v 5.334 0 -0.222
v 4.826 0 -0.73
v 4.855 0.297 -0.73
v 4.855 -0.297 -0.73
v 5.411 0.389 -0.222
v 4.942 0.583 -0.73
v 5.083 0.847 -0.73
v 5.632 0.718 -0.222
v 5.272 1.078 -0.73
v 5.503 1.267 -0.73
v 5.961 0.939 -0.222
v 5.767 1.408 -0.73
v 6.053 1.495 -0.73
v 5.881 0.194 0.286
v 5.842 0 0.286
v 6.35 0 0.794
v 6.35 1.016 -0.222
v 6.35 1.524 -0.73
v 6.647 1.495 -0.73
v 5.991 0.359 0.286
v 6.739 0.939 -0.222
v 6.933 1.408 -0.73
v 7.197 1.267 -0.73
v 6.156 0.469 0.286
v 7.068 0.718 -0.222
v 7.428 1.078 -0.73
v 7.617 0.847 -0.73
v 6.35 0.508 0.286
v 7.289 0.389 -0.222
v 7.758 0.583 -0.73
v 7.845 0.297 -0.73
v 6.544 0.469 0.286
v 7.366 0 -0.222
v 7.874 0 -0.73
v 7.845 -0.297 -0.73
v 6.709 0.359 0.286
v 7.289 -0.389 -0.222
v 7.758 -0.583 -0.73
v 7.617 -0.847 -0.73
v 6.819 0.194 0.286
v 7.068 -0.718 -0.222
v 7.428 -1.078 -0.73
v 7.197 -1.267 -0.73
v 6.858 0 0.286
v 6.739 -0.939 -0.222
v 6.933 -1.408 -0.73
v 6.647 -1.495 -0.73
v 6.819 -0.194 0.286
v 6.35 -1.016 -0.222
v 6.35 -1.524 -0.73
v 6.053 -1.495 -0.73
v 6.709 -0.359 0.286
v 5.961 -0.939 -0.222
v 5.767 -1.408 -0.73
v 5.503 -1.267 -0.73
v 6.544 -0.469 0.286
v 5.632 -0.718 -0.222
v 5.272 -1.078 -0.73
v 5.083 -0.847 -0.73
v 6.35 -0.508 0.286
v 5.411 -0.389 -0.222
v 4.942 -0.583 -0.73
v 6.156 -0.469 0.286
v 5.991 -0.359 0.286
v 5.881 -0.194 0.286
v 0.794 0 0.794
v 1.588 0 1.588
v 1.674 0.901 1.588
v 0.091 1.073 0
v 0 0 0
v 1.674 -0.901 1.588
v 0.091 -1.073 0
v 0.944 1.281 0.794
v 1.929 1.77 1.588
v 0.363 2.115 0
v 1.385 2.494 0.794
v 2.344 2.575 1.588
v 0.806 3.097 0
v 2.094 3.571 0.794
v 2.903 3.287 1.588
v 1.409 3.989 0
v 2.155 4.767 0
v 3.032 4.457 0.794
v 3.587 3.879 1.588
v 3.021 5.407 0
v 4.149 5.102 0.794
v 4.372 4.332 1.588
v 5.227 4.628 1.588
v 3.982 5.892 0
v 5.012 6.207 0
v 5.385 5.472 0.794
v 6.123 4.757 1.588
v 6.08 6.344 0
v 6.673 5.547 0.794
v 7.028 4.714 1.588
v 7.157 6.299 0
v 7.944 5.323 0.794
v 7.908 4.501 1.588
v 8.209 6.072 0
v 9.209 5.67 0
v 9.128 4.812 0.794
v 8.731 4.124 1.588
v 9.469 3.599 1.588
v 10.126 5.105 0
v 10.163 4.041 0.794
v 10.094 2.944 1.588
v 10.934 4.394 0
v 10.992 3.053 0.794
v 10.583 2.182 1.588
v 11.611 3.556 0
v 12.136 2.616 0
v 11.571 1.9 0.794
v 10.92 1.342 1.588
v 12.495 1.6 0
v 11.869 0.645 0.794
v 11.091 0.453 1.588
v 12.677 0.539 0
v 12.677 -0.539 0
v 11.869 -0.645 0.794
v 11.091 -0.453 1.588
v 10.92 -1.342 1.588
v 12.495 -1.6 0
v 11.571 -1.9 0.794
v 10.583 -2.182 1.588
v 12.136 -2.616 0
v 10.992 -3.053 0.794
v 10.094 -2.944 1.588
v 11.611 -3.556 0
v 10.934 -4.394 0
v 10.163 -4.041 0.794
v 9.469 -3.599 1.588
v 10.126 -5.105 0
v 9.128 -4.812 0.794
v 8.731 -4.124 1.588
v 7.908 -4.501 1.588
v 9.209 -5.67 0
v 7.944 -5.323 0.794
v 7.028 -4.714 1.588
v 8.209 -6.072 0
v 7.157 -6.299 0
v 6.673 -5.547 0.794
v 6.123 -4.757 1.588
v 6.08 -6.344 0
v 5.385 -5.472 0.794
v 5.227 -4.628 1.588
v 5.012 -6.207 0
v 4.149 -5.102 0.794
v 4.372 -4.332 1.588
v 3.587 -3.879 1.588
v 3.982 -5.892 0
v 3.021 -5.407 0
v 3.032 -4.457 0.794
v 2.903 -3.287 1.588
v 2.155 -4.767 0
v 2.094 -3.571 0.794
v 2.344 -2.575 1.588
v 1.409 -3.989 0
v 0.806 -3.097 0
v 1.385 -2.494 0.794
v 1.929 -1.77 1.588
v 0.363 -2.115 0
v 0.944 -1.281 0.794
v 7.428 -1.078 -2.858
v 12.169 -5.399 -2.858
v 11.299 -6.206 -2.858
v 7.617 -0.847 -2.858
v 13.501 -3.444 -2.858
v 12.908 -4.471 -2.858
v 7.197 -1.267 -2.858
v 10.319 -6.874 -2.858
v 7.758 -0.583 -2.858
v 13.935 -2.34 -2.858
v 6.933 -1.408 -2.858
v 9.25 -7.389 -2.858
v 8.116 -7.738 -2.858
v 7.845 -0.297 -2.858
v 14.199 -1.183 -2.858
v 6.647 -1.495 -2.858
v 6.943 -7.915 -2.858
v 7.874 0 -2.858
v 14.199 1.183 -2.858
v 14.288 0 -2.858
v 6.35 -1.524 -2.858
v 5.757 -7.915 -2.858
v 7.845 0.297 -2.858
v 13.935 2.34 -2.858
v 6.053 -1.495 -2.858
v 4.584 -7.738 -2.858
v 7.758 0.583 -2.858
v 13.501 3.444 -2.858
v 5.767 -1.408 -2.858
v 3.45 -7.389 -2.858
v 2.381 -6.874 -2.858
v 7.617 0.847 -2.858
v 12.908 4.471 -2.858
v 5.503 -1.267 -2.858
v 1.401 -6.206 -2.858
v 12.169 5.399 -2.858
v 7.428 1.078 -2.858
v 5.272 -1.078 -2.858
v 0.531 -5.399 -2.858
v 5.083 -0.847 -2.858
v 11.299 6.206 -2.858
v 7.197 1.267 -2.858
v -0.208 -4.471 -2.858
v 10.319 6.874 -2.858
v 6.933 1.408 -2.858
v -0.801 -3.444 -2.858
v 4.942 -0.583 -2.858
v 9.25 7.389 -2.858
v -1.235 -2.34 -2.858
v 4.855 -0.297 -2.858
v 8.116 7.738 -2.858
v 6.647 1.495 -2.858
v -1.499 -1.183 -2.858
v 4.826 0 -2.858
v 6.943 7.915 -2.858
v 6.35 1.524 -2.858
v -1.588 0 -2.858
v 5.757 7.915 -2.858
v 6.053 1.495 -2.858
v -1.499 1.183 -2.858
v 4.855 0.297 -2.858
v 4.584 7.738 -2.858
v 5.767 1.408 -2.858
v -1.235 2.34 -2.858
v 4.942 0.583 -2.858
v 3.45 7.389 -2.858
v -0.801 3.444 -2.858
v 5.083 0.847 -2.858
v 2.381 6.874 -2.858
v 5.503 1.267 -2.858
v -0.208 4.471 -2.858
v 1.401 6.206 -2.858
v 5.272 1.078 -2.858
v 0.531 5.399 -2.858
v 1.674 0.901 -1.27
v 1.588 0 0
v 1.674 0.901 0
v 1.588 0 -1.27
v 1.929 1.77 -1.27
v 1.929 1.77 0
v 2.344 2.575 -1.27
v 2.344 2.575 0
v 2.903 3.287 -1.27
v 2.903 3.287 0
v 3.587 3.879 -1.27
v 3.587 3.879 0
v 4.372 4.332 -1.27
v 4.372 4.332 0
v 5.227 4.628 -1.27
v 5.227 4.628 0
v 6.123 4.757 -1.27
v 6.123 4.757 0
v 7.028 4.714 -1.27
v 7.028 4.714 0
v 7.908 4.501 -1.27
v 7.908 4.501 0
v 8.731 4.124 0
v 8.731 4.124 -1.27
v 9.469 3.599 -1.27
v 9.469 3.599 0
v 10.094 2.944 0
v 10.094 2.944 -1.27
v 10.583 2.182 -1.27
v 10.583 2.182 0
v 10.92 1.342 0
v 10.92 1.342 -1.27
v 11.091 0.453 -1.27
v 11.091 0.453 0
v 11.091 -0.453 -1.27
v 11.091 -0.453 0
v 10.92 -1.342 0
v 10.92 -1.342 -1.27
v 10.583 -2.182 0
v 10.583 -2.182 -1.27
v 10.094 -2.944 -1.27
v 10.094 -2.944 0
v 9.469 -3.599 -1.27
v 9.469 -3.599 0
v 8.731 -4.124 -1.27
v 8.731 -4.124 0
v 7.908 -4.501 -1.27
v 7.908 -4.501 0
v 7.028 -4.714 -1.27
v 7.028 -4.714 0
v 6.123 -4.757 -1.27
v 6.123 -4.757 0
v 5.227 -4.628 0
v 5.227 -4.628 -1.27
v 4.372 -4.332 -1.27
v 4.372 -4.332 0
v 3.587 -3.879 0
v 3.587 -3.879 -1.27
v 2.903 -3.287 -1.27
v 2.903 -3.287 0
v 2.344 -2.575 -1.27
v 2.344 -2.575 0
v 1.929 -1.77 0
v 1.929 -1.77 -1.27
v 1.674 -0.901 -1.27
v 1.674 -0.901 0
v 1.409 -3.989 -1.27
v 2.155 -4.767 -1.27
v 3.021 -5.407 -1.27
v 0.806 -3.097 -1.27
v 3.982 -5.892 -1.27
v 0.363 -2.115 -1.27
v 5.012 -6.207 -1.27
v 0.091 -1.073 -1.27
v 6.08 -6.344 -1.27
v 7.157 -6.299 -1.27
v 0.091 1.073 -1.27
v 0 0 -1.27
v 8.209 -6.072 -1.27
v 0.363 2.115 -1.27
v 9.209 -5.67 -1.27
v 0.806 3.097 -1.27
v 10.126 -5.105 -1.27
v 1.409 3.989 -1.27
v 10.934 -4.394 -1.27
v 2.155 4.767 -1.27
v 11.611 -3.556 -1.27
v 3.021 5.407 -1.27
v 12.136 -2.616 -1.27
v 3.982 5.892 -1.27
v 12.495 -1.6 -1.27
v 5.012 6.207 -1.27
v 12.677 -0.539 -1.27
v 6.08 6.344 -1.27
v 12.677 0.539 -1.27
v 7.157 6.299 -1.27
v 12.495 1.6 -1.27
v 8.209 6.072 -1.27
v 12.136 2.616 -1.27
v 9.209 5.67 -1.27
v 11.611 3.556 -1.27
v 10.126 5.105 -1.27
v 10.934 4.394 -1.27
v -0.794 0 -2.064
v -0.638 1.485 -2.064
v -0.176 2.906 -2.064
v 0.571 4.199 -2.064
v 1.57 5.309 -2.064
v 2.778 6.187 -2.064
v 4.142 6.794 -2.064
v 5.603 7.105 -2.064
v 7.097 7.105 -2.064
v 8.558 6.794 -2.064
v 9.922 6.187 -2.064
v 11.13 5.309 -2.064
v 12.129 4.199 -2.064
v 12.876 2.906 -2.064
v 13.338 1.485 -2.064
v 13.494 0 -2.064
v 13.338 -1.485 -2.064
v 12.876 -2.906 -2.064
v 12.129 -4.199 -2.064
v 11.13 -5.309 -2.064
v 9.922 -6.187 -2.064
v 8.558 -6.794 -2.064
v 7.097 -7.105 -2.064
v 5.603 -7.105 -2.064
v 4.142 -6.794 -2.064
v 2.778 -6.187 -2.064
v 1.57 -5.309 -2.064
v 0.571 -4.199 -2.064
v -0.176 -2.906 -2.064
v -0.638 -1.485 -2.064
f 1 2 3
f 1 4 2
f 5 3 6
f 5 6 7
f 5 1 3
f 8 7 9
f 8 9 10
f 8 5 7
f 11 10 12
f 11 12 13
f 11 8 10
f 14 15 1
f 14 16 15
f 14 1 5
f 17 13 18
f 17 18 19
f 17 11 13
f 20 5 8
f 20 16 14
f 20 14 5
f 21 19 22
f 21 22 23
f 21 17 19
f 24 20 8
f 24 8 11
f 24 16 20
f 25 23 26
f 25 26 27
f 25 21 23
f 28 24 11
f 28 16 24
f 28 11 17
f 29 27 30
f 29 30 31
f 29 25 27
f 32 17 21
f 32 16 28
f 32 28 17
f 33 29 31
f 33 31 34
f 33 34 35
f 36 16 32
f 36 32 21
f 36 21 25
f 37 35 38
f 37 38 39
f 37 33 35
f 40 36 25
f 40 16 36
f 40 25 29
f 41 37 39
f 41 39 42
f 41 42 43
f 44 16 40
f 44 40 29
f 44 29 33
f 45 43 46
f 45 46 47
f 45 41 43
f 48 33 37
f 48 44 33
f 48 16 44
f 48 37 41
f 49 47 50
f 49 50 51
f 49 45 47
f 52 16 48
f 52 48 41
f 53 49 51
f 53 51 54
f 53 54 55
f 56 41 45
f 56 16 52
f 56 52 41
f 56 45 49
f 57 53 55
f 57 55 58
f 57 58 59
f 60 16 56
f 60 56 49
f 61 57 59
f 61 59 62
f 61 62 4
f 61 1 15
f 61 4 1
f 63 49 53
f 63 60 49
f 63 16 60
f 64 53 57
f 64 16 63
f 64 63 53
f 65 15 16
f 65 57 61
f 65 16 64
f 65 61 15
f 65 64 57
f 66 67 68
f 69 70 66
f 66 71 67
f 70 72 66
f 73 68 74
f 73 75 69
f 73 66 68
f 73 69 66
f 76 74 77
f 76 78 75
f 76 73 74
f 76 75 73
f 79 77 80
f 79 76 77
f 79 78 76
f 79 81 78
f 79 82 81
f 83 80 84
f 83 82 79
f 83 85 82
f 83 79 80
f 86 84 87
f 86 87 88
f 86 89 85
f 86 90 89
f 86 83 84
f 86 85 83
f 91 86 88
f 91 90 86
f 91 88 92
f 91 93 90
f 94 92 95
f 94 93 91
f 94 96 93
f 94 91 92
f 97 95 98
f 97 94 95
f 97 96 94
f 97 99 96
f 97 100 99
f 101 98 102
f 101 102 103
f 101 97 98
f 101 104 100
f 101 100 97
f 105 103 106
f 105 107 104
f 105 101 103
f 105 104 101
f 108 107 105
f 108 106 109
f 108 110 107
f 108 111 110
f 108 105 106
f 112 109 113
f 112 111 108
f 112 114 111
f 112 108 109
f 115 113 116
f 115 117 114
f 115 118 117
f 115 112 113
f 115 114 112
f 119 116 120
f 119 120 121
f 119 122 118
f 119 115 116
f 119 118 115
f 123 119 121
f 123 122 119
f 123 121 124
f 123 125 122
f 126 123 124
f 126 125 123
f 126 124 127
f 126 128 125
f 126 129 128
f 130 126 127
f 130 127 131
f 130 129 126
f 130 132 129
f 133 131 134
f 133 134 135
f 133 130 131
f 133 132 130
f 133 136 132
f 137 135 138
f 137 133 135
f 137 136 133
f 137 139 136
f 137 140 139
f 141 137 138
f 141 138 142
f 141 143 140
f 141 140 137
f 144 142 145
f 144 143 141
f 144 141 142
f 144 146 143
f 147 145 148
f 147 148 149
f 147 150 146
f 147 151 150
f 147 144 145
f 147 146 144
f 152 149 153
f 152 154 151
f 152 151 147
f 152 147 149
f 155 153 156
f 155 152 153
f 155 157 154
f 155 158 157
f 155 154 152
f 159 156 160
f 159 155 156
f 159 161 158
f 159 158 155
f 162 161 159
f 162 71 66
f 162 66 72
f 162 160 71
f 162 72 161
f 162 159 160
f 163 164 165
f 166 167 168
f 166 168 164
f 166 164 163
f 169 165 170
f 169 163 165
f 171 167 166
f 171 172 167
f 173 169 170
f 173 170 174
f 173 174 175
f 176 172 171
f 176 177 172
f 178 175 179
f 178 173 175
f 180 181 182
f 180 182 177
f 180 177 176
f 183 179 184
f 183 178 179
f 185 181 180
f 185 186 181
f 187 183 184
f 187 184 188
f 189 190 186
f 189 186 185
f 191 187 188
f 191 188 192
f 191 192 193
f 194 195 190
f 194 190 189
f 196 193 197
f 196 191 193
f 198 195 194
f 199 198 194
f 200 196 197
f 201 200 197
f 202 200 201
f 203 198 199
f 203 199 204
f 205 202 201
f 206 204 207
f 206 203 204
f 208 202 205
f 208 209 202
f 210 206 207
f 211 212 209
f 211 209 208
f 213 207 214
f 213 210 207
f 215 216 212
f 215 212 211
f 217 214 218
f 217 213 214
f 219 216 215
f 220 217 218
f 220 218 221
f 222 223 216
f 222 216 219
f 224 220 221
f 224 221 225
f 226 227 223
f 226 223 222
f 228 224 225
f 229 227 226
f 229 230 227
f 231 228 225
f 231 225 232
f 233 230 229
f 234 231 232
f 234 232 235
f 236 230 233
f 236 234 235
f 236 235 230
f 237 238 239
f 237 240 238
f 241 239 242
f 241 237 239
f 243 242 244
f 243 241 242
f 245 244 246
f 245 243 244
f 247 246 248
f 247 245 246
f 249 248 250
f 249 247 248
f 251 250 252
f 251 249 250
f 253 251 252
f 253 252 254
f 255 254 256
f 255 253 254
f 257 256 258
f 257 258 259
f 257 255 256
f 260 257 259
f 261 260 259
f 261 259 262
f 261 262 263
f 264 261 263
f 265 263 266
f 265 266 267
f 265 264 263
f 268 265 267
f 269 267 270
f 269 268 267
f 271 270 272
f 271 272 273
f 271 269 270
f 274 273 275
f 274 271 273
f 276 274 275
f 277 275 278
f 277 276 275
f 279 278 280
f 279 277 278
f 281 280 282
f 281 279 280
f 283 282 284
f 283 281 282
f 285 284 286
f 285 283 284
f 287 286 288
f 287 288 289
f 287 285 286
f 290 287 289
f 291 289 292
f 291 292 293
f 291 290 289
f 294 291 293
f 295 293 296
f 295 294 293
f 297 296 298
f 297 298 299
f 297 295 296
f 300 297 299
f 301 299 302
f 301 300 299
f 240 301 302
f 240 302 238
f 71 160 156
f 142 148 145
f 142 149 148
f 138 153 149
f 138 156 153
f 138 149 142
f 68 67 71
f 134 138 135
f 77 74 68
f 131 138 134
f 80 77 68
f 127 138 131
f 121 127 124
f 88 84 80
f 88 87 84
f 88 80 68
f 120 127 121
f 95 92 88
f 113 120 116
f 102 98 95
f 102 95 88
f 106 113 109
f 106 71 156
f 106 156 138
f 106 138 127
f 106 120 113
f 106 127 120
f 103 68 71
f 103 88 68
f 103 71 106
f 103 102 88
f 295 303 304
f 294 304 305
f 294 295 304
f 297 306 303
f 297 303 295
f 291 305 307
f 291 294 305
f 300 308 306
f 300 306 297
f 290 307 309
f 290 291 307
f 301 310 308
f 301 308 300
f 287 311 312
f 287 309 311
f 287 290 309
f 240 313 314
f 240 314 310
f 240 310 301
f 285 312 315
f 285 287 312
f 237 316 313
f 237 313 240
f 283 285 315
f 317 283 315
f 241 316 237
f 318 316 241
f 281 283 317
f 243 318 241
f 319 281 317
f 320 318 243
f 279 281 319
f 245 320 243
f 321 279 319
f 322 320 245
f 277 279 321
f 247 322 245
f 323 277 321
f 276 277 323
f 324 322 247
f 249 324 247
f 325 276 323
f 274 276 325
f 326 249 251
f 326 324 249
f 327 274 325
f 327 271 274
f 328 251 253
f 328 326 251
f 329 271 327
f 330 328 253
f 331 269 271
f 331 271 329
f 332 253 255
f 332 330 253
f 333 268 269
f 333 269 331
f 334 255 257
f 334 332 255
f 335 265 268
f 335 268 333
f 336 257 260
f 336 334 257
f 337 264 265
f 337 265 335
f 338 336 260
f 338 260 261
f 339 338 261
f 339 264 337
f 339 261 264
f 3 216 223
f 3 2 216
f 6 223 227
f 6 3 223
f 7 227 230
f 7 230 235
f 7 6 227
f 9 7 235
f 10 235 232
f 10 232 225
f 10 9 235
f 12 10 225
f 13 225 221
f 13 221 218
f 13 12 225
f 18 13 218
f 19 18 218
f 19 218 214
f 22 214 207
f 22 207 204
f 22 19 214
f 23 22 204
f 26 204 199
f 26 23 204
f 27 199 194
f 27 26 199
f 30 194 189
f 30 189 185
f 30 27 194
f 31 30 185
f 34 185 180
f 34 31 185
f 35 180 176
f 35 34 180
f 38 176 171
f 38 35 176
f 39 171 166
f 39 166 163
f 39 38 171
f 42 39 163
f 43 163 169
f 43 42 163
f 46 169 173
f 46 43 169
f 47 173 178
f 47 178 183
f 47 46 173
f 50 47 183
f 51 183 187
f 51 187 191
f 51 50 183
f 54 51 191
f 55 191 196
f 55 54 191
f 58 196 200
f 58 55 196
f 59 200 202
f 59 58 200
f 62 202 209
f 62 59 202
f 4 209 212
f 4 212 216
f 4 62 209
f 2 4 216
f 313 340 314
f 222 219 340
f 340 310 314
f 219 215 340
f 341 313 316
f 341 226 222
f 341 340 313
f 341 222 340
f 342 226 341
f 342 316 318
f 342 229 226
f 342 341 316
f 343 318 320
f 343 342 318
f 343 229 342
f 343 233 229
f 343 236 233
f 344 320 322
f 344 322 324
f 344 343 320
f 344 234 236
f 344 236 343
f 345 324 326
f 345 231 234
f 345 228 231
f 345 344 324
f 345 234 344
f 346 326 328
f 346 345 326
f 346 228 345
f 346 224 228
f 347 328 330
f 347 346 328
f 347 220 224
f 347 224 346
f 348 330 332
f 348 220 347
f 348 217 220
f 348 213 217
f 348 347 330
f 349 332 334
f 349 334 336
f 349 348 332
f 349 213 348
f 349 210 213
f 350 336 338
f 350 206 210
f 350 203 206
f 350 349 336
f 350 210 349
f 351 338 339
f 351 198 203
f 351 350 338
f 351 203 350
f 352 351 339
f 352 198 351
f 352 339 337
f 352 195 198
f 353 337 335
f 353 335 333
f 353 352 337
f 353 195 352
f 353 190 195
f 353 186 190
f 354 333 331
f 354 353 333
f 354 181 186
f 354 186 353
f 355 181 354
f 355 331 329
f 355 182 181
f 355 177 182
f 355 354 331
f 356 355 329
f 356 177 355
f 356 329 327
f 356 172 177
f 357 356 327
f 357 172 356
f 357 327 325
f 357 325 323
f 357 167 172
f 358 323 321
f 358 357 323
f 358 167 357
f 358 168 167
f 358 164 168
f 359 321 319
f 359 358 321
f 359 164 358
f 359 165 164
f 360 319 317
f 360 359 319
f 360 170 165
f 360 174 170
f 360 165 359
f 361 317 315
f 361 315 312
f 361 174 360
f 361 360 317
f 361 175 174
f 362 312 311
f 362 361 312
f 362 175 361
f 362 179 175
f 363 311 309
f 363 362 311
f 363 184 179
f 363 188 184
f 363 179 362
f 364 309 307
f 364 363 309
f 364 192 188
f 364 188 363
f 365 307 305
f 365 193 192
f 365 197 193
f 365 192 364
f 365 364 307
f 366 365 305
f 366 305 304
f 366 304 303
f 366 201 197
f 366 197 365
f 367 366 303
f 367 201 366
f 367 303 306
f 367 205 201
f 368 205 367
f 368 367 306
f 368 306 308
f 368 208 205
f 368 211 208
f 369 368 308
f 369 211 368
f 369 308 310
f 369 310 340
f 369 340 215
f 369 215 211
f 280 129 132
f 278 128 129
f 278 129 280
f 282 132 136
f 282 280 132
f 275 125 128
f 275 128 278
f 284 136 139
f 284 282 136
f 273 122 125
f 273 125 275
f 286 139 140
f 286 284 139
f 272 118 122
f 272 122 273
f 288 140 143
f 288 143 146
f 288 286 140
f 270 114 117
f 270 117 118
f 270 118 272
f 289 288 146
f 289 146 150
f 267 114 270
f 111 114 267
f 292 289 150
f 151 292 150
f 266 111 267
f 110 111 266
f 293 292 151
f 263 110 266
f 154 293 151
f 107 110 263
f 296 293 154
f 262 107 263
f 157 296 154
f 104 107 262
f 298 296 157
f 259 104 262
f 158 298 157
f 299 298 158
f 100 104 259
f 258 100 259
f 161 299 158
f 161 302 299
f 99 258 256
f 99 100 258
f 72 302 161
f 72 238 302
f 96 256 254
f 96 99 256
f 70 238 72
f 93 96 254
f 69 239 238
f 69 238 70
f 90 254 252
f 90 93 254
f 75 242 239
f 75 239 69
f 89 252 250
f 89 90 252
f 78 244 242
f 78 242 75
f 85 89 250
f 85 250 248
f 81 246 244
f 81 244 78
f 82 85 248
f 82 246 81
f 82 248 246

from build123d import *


with BuildPart() as f1:
    # F0 (on Front) → F1 (revolve)
    with BuildSketch(Plane.XZ):
        Polygon((1.5875, 1.5875), (0, 0), (1.5875, 0), (1.5875, -1.27), (0, -1.27), (0, -2.8575), (2.69875, -2.8575), (4.826, -0.73025), (6.35, 0.79375), (6.35, 1.5875), align=None)
        Polygon((0, -2.8575), (0, -1.27), (-1.5875, -2.8575), align=None)
        Polygon((4.826, -2.8575), (4.826, -0.73025), (2.69875, -2.8575), align=None)
    revolve(axis=Axis((6.35, 0, 1.190625), (0, 0, -1)))


solid = f1.part
